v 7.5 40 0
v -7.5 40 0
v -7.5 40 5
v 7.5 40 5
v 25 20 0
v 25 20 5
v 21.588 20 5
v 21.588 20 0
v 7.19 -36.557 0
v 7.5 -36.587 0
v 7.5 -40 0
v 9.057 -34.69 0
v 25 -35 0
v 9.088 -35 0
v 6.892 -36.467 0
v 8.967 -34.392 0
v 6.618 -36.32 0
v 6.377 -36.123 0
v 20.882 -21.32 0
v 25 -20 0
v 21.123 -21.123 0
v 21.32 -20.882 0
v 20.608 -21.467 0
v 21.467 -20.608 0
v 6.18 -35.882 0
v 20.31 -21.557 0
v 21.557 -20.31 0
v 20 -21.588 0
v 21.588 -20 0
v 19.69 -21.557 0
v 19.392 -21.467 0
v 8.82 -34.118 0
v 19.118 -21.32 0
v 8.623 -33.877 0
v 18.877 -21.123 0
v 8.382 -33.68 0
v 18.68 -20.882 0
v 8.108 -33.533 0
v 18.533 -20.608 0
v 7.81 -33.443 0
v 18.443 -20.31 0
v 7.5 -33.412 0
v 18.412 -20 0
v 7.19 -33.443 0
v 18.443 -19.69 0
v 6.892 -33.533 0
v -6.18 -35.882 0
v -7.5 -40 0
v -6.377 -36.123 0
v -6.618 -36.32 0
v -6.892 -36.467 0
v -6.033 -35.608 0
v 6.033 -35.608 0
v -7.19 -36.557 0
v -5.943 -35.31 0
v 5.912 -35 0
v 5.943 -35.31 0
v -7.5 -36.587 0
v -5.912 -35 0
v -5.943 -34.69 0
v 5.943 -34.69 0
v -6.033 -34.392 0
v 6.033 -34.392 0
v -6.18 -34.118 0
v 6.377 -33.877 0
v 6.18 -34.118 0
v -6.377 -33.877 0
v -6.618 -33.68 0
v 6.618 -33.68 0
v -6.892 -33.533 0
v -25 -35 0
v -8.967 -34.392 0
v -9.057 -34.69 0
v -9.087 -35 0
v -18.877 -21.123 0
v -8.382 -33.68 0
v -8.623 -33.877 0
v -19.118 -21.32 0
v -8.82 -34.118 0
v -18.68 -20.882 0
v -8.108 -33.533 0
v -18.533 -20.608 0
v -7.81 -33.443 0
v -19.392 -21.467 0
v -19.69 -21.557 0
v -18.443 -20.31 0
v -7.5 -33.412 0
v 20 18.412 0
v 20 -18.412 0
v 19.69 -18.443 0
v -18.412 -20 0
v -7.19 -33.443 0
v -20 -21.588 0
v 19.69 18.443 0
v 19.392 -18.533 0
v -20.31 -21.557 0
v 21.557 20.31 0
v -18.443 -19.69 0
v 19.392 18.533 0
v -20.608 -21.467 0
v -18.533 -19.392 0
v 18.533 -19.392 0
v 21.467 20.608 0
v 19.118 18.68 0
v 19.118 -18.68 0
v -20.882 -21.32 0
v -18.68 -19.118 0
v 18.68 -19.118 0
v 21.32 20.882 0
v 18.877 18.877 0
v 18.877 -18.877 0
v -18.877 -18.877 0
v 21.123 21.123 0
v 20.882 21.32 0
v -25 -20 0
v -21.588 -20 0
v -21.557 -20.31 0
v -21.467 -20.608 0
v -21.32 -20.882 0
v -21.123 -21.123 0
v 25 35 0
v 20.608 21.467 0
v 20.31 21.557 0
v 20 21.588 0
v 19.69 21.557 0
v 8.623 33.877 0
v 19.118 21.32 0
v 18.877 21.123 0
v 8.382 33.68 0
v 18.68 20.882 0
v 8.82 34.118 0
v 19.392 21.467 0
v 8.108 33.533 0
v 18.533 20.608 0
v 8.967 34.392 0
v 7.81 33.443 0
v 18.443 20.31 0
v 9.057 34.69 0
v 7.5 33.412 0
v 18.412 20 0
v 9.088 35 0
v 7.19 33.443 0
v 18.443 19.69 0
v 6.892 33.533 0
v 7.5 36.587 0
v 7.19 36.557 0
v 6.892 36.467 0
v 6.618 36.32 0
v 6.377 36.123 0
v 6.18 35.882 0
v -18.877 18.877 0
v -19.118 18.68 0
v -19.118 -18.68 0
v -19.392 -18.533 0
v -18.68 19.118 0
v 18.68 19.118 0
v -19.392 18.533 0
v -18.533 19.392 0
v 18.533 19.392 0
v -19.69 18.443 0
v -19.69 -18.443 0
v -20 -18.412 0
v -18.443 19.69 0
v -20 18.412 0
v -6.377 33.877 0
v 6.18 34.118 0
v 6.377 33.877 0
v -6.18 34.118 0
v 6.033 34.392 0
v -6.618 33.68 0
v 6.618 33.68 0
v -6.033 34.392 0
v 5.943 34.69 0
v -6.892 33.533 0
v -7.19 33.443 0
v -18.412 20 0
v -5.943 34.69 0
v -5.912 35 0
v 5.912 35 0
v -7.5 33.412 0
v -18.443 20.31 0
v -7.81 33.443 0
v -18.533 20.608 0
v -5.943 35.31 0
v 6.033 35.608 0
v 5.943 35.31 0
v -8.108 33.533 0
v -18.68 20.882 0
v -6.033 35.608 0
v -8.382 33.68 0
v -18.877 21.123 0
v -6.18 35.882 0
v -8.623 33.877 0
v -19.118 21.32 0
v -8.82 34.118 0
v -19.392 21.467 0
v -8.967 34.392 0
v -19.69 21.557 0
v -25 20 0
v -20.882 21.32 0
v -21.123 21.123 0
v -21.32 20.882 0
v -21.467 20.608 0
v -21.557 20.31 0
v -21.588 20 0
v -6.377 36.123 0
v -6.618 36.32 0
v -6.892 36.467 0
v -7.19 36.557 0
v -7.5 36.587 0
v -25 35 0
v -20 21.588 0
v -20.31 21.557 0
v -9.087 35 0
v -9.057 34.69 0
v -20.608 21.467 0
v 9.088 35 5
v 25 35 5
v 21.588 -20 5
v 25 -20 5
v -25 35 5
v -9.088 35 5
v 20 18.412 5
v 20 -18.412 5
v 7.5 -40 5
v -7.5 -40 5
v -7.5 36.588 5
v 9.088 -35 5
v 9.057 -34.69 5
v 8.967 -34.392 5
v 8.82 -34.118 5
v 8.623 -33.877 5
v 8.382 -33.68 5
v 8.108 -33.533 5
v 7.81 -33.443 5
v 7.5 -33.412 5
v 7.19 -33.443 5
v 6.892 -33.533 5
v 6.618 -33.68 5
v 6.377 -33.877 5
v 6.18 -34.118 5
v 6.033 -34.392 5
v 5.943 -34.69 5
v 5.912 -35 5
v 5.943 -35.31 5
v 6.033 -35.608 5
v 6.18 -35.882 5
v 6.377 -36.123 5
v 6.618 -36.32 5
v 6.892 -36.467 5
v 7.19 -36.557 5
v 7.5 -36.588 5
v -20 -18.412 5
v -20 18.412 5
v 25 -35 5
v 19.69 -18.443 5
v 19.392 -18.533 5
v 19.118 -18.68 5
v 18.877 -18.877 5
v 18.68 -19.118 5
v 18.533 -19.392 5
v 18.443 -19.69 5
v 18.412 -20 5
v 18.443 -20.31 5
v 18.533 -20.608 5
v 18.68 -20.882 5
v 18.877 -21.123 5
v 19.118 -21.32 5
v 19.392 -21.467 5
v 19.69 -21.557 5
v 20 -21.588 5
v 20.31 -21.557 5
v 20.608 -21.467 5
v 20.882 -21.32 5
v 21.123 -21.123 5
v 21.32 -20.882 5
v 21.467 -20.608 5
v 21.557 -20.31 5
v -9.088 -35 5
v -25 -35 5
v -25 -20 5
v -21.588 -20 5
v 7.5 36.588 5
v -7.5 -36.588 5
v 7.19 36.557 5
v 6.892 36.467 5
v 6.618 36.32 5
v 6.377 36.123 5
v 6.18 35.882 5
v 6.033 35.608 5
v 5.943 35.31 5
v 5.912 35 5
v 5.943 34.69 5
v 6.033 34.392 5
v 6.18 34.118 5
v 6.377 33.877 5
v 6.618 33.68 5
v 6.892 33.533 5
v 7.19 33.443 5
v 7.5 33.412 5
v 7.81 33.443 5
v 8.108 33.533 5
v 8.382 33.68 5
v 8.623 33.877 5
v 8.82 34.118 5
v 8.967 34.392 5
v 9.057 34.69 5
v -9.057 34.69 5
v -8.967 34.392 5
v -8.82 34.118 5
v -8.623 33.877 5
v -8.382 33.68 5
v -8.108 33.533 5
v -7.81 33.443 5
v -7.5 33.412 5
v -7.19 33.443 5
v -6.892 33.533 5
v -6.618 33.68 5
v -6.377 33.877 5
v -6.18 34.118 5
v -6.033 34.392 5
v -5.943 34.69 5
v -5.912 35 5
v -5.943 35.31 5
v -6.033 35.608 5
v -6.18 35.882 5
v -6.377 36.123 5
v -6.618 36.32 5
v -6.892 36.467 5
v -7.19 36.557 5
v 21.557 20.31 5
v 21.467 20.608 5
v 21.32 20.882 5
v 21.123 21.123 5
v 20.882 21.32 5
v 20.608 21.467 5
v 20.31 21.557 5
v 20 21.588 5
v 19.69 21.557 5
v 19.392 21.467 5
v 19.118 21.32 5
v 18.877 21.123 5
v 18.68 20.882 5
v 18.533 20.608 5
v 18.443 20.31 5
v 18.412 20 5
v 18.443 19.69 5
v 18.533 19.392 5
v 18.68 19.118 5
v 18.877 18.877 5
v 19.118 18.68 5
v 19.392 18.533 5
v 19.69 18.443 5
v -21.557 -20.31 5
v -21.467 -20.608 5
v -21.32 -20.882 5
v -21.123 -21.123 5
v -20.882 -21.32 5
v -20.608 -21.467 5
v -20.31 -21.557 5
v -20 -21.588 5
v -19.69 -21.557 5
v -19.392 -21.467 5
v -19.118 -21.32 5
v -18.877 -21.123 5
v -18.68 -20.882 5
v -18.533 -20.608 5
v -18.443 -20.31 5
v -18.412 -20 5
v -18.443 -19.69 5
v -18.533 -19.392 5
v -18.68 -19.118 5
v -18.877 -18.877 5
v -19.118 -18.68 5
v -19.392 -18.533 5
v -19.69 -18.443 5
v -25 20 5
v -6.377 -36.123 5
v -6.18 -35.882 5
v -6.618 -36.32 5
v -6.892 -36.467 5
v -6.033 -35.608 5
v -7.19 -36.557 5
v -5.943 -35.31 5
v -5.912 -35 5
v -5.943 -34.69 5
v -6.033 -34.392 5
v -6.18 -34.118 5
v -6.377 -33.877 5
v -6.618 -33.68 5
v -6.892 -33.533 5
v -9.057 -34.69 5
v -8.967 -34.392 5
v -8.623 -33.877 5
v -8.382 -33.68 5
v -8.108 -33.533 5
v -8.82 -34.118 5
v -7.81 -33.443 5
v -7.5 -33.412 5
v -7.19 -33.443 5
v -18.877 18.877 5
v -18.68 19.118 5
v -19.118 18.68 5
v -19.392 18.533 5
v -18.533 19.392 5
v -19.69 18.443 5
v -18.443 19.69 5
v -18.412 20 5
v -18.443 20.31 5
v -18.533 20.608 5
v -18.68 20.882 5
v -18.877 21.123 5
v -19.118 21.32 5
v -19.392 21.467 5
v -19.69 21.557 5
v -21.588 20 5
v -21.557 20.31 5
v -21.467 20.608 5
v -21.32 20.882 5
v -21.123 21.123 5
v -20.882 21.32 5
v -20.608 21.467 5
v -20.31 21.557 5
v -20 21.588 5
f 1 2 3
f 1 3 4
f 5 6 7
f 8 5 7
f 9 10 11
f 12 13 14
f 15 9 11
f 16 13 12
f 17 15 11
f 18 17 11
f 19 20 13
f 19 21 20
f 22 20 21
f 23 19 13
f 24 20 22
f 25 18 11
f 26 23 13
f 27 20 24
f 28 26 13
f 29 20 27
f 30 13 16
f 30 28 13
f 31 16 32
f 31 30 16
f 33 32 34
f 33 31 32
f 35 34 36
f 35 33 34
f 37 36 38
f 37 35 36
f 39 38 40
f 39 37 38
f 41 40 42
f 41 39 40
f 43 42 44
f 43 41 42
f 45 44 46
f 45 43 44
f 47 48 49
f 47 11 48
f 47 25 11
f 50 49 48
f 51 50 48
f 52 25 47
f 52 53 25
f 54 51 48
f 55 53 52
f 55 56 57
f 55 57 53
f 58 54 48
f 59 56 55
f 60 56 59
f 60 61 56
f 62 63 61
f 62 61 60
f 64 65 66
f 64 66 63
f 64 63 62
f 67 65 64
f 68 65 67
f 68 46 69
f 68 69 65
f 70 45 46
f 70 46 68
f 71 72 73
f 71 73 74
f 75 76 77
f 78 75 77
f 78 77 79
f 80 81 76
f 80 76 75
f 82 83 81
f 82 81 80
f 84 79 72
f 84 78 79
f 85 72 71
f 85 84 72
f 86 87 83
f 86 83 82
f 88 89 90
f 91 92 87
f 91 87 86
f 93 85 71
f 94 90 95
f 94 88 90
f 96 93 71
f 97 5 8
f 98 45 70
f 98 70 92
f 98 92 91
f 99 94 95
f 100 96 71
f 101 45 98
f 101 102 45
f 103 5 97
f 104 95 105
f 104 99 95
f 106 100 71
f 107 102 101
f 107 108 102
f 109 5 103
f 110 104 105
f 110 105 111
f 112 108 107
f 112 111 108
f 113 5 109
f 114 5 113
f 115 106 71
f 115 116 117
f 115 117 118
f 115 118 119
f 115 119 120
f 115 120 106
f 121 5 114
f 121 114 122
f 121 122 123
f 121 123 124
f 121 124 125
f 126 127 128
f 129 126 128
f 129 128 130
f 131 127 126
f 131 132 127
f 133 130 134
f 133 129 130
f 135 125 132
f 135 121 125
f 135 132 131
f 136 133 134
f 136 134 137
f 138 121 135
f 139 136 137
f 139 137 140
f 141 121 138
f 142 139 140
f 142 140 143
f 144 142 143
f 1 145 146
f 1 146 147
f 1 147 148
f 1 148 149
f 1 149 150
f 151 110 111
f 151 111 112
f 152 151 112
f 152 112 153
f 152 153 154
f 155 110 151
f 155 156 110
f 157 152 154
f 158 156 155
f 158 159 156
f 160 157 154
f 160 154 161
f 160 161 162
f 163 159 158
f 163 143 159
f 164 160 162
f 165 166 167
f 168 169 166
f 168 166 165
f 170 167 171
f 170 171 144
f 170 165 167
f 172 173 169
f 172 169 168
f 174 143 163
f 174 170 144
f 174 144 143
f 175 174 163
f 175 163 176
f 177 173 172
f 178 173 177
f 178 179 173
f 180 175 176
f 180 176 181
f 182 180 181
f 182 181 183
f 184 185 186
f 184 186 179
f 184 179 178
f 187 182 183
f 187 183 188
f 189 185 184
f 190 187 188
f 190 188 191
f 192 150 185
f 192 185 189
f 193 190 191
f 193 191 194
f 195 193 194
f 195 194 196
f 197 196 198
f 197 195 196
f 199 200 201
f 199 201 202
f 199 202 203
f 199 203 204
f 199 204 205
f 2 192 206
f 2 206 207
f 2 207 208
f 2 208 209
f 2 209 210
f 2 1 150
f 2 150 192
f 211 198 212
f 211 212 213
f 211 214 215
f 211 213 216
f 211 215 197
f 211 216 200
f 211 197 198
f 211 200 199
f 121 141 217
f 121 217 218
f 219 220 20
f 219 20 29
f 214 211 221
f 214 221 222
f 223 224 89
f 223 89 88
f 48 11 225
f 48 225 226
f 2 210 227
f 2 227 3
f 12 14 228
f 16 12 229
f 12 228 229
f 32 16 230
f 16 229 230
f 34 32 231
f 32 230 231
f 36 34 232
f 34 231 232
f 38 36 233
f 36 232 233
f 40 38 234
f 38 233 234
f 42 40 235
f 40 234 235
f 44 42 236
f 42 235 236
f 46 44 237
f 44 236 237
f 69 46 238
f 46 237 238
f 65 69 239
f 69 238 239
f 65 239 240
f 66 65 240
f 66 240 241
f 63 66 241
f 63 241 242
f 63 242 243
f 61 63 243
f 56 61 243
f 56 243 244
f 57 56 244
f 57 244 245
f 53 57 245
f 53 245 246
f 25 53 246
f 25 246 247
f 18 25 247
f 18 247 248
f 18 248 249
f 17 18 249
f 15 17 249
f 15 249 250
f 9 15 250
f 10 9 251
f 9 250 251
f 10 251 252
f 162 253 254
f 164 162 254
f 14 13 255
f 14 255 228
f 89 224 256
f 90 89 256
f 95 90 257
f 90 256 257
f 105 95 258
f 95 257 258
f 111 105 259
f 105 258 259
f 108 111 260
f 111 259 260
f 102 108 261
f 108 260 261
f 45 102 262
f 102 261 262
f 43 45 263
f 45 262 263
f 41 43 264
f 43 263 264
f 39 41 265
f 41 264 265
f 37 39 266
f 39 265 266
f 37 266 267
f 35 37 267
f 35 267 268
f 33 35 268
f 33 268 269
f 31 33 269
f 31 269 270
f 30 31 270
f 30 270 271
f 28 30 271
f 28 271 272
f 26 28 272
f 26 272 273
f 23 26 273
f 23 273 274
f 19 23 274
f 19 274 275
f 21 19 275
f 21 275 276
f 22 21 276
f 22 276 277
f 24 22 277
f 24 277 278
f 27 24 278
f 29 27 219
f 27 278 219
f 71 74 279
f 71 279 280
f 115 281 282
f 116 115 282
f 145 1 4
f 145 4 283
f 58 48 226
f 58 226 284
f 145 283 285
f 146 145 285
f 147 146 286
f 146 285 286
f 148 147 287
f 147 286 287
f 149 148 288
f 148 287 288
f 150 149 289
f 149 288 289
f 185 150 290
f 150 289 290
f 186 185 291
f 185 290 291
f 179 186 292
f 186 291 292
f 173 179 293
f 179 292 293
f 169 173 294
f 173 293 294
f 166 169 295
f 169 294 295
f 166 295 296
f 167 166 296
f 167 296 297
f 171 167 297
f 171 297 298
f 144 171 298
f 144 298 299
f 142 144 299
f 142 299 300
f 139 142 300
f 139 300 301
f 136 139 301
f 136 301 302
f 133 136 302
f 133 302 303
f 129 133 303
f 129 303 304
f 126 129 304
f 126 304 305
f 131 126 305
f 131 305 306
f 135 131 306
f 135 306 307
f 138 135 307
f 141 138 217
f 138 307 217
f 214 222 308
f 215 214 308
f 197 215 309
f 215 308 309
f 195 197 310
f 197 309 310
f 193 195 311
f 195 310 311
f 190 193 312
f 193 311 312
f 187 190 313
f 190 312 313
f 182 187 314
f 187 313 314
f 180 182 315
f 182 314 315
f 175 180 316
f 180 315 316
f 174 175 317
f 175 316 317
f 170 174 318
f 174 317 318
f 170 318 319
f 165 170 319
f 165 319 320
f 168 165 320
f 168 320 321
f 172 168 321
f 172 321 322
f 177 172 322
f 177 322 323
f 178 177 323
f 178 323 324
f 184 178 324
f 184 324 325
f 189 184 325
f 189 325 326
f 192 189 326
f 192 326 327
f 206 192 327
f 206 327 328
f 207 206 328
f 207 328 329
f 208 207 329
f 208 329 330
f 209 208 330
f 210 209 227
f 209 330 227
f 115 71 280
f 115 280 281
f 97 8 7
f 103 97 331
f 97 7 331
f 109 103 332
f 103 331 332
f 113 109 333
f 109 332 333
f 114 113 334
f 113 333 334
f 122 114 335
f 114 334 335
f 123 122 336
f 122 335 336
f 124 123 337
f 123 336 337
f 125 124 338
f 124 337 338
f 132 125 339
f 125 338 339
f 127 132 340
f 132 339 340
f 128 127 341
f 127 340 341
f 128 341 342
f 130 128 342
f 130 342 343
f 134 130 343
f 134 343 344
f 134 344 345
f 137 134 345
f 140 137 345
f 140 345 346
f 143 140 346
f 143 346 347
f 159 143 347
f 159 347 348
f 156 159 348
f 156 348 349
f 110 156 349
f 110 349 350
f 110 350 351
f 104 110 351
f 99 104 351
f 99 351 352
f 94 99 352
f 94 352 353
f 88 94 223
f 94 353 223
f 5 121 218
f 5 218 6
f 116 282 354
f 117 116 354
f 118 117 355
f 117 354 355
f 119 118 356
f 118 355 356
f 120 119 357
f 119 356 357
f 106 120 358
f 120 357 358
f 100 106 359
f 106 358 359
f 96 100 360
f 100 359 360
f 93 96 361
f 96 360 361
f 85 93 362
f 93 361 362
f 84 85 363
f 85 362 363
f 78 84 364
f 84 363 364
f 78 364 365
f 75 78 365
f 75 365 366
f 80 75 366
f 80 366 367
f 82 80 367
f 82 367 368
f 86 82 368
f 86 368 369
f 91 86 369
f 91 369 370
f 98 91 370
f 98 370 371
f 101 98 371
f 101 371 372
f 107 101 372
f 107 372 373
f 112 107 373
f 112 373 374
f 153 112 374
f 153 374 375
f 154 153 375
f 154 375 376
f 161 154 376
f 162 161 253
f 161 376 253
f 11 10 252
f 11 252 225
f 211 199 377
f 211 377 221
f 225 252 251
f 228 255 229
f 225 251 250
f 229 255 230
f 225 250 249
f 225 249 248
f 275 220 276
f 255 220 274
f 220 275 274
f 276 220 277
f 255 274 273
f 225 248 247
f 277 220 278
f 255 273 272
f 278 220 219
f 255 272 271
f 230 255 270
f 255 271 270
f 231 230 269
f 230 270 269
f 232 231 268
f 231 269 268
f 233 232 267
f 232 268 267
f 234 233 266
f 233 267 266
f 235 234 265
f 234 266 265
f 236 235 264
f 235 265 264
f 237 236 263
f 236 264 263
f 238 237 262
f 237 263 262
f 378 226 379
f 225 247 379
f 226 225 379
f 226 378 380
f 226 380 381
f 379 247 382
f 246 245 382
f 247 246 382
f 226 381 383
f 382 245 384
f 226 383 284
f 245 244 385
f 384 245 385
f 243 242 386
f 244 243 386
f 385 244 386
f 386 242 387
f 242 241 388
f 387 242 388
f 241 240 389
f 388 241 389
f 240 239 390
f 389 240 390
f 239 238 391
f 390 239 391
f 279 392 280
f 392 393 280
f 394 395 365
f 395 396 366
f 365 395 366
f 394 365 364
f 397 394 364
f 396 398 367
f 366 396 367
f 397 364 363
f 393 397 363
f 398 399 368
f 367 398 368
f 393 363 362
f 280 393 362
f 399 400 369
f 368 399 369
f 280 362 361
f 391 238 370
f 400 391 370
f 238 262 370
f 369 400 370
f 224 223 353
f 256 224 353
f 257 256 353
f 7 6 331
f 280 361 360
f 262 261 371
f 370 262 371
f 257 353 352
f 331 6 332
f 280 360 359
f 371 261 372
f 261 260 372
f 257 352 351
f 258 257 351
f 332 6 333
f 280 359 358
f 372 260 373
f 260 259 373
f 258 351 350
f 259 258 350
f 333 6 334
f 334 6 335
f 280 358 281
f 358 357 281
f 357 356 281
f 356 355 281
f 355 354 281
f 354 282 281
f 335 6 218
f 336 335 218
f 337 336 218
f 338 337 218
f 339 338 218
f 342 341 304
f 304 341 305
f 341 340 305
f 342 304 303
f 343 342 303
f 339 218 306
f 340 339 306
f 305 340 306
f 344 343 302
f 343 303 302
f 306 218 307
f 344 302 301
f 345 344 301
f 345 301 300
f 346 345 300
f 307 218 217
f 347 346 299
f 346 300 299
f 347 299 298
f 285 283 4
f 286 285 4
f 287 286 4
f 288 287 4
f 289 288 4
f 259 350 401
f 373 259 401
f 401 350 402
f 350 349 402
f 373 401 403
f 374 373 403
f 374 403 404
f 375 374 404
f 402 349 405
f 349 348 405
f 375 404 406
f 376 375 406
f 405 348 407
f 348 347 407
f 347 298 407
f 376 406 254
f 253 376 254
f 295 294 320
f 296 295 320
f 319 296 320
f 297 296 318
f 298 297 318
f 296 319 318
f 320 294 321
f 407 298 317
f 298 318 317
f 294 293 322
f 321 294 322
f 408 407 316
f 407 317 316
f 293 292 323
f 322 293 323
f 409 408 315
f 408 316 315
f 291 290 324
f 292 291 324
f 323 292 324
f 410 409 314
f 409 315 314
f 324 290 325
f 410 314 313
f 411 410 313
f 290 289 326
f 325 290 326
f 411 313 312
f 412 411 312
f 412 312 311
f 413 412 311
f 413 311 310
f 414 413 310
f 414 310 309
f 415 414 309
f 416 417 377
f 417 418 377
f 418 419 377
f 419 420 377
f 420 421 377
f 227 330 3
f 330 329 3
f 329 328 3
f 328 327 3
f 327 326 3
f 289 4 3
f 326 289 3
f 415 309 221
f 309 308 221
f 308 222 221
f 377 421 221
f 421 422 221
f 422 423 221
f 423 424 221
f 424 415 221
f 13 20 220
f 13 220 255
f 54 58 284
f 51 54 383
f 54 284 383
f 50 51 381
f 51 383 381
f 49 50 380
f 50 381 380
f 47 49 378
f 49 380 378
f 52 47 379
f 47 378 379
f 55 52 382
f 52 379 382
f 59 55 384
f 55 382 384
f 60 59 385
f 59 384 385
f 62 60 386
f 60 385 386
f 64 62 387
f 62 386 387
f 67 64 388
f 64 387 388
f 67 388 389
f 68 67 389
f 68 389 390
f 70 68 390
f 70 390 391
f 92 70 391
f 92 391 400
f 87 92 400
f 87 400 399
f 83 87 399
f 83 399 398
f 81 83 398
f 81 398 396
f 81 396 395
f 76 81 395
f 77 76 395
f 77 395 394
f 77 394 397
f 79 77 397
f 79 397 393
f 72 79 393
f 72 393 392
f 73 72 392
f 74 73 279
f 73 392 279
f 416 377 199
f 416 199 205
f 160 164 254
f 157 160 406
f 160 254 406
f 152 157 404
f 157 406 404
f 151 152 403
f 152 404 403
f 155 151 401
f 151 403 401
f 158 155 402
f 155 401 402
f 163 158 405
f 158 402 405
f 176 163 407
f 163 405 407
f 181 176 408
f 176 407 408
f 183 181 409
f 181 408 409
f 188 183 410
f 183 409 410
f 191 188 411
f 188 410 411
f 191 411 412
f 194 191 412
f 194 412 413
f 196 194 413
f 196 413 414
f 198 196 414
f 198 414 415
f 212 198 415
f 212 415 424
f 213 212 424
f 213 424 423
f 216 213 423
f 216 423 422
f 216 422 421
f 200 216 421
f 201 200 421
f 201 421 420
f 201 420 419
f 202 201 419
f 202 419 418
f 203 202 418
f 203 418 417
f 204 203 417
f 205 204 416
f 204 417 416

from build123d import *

# Parameters (mm, degrees)
BOSS_EXTRUDE2_DEPTH = 5
SKETCH3_W           = 5
SKETCH3_H           = 40
CUT_EXTRUDE1_DEPTH  = 5
SKETCH4_R           = 1.5875
CUT_EXTRUDE2_DEPTH  = 6


with BuildPart() as part:
    # Sketch2 → Boss-Extrude2 (new body)
    with BuildSketch(Plane.XY):
        Polygon((-7.5, 40), (7.5, 40), (7.5, 35), (25, 35), (25, -35), (7.5, -35), (7.5, -40), (-7.5, -40), (-7.5, -35), (-25, -35), (-25, 35), (-7.5, 35), align=None)
    extrude(amount=BOSS_EXTRUDE2_DEPTH)

    # Sketch3 → Cut-Extrude1 (cut)
    with BuildSketch(Plane.XY.offset(5)):
        with Locations((-22.5, 0)):
            Rectangle(SKETCH3_W, SKETCH3_H)
    cut_extrude1 = extrude(amount=-CUT_EXTRUDE1_DEPTH, mode=Mode.SUBTRACT)

    # Mirror1: Cut-Extrude1 across plane
    add(cut_extrude1.mirror(Plane(origin=(0, 0, 0), x_dir=(0, 0, 1), z_dir=(1, 0, 0))), mode=Mode.SUBTRACT)

    # Sketch4 → Cut-Extrude2 (cut, through all)
    with BuildSketch(Plane.XY.offset(5)):
        with Locations((-7.5, 35)):
            Circle(SKETCH4_R)
        with Locations((7.5, 35)):
            Circle(SKETCH4_R)
        with Locations((20, 20)):
            Circle(SKETCH4_R)
        with Locations((-20, 20)):
            Circle(SKETCH4_R)
        with Locations((-20, -20)):
            Circle(SKETCH4_R)
        with Locations((-7.5, -35)):
            Circle(SKETCH4_R)
        with Locations((7.5, -35)):
            Circle(SKETCH4_R)
        with Locations((20, -20)):
            Circle(SKETCH4_R)
    extrude(amount=-CUT_EXTRUDE2_DEPTH, mode=Mode.SUBTRACT)


solid = part.part
